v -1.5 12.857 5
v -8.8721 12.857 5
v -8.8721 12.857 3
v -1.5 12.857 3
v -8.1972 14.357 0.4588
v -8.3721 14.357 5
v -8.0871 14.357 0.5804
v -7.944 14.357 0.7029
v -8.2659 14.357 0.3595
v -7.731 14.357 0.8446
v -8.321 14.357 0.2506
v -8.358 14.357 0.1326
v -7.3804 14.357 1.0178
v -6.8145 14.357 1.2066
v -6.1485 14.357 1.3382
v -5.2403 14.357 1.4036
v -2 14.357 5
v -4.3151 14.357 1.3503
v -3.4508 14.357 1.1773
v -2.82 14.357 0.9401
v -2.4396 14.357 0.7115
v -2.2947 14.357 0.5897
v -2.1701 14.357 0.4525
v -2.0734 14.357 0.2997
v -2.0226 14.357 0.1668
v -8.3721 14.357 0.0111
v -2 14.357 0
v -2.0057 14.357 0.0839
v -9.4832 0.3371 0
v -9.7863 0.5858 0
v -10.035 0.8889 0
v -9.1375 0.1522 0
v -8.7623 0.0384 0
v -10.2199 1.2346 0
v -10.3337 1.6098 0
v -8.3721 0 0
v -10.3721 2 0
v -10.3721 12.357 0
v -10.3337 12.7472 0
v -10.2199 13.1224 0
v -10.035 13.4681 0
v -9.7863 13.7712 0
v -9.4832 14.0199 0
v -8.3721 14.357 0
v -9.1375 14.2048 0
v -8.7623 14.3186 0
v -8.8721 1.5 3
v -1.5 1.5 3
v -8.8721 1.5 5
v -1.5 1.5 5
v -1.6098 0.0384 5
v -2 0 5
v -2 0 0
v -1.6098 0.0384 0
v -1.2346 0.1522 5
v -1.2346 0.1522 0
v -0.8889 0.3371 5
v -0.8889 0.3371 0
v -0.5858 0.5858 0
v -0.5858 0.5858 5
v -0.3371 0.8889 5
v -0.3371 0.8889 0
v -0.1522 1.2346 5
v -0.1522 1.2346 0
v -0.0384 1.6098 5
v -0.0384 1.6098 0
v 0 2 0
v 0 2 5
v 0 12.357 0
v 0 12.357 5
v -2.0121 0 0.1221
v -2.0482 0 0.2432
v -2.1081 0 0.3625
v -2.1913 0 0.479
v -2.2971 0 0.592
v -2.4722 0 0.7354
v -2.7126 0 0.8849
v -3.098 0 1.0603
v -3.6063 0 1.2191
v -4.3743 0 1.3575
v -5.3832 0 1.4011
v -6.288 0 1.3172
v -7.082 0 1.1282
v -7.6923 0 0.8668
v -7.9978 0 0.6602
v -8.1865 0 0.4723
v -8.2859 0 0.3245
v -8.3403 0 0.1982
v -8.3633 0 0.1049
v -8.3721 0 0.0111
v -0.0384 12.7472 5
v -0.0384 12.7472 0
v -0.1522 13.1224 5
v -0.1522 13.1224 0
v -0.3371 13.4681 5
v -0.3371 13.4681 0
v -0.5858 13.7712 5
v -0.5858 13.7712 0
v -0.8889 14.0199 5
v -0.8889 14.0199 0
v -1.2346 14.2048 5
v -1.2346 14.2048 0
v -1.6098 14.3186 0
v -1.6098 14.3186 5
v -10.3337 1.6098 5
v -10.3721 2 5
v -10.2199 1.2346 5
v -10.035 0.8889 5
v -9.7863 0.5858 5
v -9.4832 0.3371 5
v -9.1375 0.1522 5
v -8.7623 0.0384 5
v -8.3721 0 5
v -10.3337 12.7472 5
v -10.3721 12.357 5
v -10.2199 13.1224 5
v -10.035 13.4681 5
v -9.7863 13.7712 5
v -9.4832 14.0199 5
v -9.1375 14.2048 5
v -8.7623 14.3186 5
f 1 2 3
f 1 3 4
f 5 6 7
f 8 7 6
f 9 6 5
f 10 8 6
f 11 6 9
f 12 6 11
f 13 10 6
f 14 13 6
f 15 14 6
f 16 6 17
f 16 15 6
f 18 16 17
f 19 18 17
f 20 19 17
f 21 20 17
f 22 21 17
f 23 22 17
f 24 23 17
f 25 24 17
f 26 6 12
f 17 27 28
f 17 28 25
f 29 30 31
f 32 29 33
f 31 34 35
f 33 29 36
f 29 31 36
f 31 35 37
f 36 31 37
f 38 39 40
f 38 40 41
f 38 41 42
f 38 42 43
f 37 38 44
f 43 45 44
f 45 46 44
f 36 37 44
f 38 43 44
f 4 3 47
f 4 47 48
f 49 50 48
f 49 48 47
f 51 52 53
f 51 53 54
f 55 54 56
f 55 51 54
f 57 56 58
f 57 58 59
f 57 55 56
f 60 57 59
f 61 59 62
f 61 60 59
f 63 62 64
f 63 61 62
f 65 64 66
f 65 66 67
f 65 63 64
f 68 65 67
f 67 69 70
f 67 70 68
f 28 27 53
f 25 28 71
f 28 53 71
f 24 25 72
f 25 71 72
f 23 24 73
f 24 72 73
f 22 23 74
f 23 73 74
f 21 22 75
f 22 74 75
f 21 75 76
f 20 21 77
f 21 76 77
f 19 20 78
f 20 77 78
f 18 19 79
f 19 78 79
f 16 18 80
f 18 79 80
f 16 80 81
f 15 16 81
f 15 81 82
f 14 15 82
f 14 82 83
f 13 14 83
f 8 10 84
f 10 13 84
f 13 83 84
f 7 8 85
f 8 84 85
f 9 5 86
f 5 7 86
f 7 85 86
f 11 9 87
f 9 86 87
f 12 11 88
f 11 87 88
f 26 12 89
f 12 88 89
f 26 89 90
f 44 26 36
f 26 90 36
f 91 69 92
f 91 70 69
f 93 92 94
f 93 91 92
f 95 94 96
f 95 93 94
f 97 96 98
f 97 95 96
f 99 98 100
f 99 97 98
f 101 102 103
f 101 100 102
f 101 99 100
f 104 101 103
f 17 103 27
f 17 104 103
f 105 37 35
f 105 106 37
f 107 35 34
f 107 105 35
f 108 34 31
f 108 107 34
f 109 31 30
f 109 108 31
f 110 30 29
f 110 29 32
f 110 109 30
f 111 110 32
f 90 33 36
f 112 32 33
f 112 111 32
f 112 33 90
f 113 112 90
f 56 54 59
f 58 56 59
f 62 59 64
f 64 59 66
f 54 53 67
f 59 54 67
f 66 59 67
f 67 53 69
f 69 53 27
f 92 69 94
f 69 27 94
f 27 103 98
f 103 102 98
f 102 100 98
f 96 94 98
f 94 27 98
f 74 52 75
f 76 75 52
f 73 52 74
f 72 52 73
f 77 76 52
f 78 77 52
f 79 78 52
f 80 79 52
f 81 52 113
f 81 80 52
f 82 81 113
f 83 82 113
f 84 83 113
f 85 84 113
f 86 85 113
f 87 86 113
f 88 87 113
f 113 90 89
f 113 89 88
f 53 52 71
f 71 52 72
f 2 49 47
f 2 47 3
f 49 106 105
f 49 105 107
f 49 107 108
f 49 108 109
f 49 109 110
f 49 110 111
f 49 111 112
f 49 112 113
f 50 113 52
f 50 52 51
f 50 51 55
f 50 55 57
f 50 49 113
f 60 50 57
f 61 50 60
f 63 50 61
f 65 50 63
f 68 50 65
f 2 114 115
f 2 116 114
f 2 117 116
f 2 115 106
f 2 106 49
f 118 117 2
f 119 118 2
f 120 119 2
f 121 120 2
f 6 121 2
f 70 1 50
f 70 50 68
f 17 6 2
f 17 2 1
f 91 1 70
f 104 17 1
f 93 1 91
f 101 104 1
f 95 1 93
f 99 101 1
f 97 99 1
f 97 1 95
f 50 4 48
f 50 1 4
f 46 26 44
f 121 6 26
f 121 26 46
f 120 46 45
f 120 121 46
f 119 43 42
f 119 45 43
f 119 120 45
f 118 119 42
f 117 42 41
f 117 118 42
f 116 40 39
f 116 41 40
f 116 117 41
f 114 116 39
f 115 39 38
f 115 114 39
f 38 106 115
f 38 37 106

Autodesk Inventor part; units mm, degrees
ref_plane "YZ Plane" through (0, 0, 0) normal (1, 0, 0) x (0, 1, 0)
ref_plane "XZ Plane" through (0, 0, 0) normal (0, 1, 0) x (-1, 0, 0)
ref_plane "XY Plane" through (0, 0, 0) normal (0, 0, 1) x (1, 0, 0)
sketch "Sketch1" plane through (0, 0, 0) normal (0, 0, 1) x (1, 0, 0)
  line L0 (0, 0) -> (-10.3721, 0)
  line L1 (-10.3721, 0) -> (-10.3721, 14.357)
  line L2 (-10.3721, 14.357) -> (0, 14.357)
  line L3 (0, 14.357) -> (0, 0)
extrude "Extrusion1" add sketch "Sketch1" along normal blind 5
sketch "Sketch2" plane through (0, 0, 5) normal (0, 0, 1) x (1, 0, 0)
  line L0 (-8.8721, 12.857) -> (-1.5, 12.857)
  line L1 (-1.5, 12.857) -> (-1.5, 1.5)
  line L2 (-1.5, 1.5) -> (-8.8721, 1.5)
  line L3 (-8.8721, 1.5) -> (-8.8721, 12.857)
  line L4 (0, 14.357) -> (-10.3721, 14.357) projected
  line L5 (-10.3721, 0) -> (0, 0) projected
  line L6 (0, 0) -> (0, 14.357) projected
  line L7 (-10.3721, 14.357) -> (-10.3721, 0) projected
  dimension "d2" = 1.5
  dimension "d3" = 1.5
  dimension "d4" = 1.5
  dimension "d5" = 1.5
extrude "Extrusion2" cut sketch "Sketch2" against normal blind 2 contours L0 L1 L2 L3
sketch "Sketch3" plane through (0, 0, 3) normal (0, 0, 1) x (1, 0, 0)
  line L0 (-8.8721, 12.857) -> (-1.5, 12.857) projected
  line L1 (-8.8721, 1.5) -> (-8.8721, 12.857) projected
  line L2 (-1.5, 12.857) -> (-1.5, 1.5) projected
  line L3 (-1.5, 1.5) -> (-8.8721, 1.5) projected
  point P0 (0, 0)
fillet "Fillet1" radius 2 1 edges at (-10.3721, 14.357, 2.5)
fillet "Fillet2" radius 2 1 edges at (0, 14.357, 2.5)
fillet "Fillet3" radius 2 1 edges at (-10.3721, 0, 2.5)
fillet "Fillet4" radius 2 1 edges at (0, 0, 2.5)
sketch "Sketch4" plane through (-8.3721, 0, 0) normal (0, -1, 0) x (1, 0, 0)
  line L0 (6.3721, 0) -> (0, 0) projected
  ellipse E0 centre (3.186, 0) end of major axis (6.3721, 0) minor radius 1.4038
  point P0 (8.3721, 0)
extrude "Extrusion3" cut sketch "Sketch4" against normal blind 50
properties part number "bateria pat 1"
